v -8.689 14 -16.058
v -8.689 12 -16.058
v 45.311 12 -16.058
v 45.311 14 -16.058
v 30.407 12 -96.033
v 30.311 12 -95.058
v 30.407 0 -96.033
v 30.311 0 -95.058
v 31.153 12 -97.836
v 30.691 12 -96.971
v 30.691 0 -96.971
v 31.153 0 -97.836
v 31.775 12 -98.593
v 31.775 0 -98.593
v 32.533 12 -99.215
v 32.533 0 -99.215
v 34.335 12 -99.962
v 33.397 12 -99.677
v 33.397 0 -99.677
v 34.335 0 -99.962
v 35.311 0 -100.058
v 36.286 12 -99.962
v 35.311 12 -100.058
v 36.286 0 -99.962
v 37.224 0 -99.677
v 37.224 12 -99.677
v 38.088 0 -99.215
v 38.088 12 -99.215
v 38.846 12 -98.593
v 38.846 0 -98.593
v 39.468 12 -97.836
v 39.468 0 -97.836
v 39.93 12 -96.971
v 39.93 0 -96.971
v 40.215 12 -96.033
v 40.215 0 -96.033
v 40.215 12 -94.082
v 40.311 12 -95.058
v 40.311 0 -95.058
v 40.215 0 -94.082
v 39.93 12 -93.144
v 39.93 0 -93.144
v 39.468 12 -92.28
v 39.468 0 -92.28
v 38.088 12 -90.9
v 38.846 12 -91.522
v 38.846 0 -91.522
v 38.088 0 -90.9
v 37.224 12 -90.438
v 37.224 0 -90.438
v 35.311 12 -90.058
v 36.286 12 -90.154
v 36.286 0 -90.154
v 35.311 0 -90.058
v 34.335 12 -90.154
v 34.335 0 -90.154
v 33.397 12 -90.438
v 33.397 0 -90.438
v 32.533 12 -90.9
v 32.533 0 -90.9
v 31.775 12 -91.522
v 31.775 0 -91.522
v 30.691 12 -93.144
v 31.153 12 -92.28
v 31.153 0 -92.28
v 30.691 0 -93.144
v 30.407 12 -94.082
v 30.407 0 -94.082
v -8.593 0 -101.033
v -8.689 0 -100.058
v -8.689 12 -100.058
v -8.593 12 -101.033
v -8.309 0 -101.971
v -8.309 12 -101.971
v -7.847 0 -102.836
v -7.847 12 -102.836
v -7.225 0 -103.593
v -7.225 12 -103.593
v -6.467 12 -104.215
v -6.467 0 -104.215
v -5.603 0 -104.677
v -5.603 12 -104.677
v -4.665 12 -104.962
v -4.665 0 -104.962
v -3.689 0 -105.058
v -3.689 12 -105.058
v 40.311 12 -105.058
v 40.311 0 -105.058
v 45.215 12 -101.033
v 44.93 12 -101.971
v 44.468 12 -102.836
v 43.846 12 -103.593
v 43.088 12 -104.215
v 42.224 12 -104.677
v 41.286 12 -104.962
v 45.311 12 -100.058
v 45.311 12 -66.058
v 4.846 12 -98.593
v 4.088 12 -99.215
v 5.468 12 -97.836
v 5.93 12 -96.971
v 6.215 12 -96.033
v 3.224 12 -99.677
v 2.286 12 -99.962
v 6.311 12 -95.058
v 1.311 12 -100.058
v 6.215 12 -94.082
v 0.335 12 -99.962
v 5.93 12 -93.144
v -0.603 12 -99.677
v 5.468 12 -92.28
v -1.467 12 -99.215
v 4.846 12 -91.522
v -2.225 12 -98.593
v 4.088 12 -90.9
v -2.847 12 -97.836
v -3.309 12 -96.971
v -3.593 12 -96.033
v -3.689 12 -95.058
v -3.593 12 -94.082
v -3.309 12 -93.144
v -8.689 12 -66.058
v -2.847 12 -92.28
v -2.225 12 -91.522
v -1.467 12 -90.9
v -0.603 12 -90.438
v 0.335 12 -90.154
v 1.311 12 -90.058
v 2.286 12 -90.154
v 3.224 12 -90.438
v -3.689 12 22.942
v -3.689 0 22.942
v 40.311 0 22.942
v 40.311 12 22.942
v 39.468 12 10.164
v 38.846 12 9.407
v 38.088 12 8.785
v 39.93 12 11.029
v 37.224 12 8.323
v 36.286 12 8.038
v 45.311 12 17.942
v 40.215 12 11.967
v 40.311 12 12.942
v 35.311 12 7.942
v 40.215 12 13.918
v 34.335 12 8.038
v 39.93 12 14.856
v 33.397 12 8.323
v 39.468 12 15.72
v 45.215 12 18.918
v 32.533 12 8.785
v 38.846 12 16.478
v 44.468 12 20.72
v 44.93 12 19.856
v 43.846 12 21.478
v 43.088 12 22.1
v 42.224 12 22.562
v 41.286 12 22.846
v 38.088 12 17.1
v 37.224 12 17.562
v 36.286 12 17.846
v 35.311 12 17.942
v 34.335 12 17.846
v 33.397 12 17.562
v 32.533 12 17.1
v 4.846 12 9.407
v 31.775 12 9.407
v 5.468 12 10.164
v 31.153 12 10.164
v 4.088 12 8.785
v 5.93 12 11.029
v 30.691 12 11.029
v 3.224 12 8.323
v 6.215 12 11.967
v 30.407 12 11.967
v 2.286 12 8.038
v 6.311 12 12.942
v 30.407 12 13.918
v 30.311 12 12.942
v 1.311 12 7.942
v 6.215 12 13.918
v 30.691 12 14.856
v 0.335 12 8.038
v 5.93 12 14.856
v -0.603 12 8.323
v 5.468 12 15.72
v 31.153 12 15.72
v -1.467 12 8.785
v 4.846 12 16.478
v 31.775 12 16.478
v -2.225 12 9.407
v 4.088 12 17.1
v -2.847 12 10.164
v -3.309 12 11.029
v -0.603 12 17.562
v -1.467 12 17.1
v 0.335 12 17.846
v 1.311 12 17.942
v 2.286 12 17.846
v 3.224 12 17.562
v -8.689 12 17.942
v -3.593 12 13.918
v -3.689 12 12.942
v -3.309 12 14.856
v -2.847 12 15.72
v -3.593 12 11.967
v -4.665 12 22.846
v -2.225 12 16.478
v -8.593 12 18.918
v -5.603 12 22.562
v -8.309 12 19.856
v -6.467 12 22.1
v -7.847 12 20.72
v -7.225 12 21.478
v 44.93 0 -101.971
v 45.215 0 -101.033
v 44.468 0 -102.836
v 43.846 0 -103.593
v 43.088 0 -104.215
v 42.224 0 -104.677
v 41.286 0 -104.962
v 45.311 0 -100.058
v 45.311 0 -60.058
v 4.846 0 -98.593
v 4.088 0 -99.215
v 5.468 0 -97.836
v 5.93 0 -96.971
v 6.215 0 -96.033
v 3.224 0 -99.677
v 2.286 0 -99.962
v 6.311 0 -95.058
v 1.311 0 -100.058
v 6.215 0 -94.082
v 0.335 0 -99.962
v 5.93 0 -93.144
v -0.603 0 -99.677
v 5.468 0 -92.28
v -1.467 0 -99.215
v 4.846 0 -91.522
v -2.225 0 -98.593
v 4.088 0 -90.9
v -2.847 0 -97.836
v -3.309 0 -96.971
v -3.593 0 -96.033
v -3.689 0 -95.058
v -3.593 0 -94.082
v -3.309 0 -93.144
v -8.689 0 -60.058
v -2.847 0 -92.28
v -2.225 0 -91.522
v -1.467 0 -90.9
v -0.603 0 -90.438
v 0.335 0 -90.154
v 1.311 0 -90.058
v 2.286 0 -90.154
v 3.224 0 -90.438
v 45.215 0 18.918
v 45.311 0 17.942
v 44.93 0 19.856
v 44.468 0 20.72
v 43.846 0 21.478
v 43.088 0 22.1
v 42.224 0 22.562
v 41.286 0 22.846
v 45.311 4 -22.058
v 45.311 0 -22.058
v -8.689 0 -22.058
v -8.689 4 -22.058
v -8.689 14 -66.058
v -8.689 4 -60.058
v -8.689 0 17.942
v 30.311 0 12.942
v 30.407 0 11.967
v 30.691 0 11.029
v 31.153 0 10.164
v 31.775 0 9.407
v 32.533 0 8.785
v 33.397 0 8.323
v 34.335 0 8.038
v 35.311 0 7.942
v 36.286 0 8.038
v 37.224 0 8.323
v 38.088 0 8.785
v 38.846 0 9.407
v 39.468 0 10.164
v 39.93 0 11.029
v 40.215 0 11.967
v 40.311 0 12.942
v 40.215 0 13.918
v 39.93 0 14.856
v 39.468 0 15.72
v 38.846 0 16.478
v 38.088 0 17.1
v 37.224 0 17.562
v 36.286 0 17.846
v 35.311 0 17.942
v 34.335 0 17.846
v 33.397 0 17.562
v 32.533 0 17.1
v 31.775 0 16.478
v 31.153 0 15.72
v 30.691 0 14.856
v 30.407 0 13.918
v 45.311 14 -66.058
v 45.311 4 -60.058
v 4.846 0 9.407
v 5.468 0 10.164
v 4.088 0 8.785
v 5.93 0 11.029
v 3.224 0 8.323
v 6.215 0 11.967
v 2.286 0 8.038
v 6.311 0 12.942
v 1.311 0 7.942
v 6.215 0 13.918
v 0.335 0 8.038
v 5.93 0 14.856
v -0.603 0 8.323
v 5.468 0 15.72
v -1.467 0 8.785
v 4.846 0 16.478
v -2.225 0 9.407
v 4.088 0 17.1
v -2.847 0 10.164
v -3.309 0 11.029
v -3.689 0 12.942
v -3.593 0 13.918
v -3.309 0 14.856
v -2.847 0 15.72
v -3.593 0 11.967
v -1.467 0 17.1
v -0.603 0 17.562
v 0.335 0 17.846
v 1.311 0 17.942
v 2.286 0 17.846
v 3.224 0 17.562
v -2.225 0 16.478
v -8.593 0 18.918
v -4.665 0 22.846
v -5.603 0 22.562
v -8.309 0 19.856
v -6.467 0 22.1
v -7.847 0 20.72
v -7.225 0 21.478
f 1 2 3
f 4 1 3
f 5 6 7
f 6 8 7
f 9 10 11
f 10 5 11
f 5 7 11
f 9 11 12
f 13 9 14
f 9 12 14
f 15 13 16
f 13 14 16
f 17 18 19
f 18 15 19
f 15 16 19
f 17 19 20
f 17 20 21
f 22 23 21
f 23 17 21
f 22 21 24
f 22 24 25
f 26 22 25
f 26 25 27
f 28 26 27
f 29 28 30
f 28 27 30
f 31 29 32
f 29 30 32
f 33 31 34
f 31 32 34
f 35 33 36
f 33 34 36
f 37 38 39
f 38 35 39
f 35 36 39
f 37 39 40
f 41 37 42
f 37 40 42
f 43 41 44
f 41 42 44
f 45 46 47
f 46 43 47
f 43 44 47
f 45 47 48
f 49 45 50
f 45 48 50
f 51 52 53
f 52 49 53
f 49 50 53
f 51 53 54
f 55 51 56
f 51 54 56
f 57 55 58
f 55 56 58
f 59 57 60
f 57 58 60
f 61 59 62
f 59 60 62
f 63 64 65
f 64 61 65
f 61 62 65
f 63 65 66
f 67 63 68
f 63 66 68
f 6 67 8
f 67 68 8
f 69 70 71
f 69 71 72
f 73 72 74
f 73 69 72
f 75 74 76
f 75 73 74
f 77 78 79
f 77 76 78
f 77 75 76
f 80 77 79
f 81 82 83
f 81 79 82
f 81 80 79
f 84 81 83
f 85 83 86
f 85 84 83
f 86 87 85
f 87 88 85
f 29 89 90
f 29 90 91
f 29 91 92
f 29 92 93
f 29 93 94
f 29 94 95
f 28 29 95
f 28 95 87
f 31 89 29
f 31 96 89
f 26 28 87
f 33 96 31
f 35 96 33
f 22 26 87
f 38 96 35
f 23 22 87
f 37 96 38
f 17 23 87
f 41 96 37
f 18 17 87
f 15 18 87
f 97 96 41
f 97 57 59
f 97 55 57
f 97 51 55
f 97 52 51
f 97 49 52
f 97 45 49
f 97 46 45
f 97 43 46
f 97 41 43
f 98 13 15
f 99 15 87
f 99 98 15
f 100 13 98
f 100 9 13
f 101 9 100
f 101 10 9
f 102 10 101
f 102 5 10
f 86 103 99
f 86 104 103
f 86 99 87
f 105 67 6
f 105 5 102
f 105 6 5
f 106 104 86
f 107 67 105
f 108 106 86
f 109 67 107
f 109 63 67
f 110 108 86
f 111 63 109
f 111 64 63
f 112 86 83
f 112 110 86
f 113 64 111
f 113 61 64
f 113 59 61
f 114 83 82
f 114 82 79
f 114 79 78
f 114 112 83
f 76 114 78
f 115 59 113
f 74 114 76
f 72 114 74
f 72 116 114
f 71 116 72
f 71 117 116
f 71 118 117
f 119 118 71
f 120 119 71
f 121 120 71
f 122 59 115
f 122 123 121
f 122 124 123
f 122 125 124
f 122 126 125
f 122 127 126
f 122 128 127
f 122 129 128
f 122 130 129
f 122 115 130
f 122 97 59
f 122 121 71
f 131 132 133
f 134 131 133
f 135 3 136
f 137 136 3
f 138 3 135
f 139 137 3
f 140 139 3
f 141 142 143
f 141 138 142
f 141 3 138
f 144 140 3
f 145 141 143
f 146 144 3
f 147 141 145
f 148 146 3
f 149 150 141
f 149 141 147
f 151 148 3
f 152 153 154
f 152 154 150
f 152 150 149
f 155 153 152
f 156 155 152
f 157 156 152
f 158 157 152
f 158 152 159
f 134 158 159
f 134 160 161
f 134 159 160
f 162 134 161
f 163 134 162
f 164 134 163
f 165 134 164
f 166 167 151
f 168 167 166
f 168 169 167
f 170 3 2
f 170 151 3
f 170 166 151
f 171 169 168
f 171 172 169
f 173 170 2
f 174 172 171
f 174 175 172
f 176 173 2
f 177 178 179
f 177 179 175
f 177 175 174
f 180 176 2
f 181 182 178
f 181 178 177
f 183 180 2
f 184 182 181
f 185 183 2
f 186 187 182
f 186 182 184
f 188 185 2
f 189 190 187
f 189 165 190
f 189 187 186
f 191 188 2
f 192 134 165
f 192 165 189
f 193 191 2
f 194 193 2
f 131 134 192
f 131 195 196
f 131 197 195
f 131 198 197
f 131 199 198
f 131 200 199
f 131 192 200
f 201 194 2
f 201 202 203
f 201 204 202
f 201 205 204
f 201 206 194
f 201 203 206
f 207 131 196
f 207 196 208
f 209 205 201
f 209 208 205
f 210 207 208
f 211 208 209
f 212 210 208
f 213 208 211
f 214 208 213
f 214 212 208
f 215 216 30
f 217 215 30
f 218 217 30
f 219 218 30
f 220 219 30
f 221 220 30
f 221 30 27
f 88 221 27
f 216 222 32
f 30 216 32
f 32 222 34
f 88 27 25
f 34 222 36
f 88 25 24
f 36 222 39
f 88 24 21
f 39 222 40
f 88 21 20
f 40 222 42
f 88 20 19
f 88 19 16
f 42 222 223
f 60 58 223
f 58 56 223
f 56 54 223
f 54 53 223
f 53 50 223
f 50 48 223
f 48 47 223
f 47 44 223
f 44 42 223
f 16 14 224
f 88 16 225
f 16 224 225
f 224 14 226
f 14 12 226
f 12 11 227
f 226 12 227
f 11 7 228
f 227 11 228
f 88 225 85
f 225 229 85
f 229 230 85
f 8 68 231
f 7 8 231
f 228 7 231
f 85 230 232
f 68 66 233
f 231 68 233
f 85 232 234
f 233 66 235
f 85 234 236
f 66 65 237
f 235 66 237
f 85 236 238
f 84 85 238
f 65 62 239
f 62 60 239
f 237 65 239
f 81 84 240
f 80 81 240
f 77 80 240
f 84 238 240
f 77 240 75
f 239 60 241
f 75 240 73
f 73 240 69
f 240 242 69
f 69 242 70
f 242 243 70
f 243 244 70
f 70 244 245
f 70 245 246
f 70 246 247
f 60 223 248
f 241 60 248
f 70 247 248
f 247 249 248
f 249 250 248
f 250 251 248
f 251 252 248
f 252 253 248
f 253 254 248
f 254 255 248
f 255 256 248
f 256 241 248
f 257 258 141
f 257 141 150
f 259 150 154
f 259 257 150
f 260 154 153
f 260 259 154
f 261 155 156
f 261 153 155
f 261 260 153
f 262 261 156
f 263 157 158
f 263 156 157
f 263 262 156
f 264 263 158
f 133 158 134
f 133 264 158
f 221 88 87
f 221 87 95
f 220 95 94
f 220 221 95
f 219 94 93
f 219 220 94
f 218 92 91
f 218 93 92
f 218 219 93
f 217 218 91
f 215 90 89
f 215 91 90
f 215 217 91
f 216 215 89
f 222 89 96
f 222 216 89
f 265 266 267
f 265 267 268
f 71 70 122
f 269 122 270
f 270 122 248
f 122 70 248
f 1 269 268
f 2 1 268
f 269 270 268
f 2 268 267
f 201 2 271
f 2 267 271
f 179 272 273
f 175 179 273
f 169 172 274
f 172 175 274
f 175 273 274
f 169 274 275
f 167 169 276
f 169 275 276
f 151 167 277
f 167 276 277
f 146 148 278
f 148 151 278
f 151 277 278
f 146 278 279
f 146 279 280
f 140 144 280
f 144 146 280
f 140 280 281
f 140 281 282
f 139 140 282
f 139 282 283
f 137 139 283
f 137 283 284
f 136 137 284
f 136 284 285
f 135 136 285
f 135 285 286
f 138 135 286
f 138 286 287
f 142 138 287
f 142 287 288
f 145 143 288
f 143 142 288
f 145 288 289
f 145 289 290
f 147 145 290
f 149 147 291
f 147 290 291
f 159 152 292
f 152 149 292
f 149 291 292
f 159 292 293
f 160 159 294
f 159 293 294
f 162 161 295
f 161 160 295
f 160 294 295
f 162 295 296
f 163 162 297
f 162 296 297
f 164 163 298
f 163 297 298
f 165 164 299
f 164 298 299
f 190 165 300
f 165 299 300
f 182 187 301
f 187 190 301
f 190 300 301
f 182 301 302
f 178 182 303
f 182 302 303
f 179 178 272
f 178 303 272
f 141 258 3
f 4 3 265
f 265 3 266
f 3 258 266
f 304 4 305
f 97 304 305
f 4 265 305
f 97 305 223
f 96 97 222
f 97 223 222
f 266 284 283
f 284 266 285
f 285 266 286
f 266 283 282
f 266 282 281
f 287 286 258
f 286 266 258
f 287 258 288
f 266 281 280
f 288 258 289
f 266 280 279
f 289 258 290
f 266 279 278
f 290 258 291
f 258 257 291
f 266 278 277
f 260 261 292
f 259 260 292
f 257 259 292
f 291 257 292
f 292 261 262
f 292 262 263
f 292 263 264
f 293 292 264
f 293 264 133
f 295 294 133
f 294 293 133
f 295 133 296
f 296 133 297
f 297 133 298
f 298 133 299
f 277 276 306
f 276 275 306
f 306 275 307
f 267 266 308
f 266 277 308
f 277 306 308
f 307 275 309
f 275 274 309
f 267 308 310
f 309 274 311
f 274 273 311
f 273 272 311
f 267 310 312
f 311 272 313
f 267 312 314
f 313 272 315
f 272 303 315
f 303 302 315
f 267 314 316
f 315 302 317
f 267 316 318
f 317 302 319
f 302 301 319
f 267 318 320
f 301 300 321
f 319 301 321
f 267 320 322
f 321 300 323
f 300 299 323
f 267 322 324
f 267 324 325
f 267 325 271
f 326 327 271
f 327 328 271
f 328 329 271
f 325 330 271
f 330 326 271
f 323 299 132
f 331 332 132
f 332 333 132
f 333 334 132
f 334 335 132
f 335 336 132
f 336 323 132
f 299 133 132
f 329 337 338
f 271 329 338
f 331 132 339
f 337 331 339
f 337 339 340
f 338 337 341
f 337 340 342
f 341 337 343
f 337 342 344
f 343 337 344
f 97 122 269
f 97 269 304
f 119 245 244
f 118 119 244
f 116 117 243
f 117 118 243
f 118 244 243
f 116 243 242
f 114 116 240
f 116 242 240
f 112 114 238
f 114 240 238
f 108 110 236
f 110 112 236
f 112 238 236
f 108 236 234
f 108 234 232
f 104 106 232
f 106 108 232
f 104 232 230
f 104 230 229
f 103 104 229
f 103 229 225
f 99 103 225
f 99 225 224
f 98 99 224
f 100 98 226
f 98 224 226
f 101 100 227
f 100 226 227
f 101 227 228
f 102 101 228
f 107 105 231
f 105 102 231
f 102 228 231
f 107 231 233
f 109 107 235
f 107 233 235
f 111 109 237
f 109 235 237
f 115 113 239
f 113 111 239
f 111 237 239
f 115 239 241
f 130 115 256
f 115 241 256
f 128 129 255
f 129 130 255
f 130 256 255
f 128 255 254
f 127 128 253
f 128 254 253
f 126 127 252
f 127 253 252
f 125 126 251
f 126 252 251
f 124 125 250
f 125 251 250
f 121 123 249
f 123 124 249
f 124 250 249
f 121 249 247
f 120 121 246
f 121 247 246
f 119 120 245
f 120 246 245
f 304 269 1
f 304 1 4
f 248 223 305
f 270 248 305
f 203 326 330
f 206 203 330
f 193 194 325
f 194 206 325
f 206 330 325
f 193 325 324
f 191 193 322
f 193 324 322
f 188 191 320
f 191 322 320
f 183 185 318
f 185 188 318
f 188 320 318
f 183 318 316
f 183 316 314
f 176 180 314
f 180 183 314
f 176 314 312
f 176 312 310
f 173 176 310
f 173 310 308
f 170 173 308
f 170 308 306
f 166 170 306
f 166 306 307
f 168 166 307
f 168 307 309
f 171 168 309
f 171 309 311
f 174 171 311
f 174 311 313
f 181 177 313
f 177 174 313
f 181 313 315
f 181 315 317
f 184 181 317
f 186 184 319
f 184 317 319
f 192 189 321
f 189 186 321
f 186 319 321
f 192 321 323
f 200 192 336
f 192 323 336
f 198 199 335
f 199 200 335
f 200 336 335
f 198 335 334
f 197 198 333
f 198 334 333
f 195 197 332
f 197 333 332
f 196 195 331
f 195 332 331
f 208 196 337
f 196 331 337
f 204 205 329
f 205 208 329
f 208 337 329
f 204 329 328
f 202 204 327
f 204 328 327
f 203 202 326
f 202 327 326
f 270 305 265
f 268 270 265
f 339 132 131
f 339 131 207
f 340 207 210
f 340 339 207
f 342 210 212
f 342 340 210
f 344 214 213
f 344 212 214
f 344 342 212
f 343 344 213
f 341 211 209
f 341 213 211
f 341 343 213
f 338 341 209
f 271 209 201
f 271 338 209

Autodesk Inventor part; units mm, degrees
ref_plane "YZ Plane" through (0, 0, 0) normal (1, 0, 0) x (0, 1, 0)
ref_plane "XZ Plane" through (0, 0, 0) normal (0, 1, 0) x (-1, 0, 0)
ref_plane "XY Plane" through (0, 0, 0) normal (0, 0, 1) x (1, 0, 0)
sketch "Sketch1" plane through (0, 0, 0) normal (0, 1, 0) x (-1, 0, 0)
  line L0 (3.6894, 22.9423) -> (-40.3106, 22.9423)
  line L1 (-45.3106, 17.9423) -> (-45.3106, -100.0577)
  line L2 (-40.3106, -105.0577) -> (3.6894, -105.0577)
  line L3 (8.6894, -100.0577) -> (8.6894, 17.9423)
  arc A0 (8.6894, 17.9423) -> (3.6894, 22.9423) centre (3.6894, 17.9423) ccw
  arc A1 (3.6894, -105.0577) -> (8.6894, -100.0577) centre (3.6894, -100.0577) ccw
  arc A2 (-40.3106, 22.9423) -> (-45.3106, 17.9423) centre (-40.3106, 17.9423) ccw
  arc A3 (-45.3106, -100.0577) -> (-40.3106, -105.0577) centre (-40.3106, -100.0577) ccw
  circle A4 centre (-1.3106, 12.9423) radius 5
  circle A5 centre (-1.3106, -95.0577) radius 5
  circle A6 centre (-35.3106, 12.9423) radius 5
  circle A7 centre (-35.3106, -95.0577) radius 5
  point P0 (0, 0)
  point P1 (-45.3106, -105.0577)
  point P2 (-45.3106, 22.9423)
  point P3 (8.6894, -105.0577)
  dimension "d0" = 54
  dimension "d1" = 128
  dimension "d2" = 5
  dimension "d3" = 5
  dimension "d4" = 5
  dimension "d5" = 5
  dimension "d6" = 10
  dimension "d7" = 10
  dimension "d8" = 10
  dimension "d9" = 10
  dimension "d10" = 10
  dimension "d11" = 10
  dimension "d12" = 10
  dimension "d13" = 10
  dimension "d14" = 10
  dimension "d15" = 10
  dimension "d16" = 10
  dimension "d17" = 10
extrude "Extrusion1" add sketch "Sketch1" along normal blind 12
sketch "Sketch2" plane through (0, 12, 0) normal (0, 1, 0) x (1, 0, 0)
  arc A0 (-8.6894, -17.9423) -> (-3.6894, -22.9423) centre (-3.6894, -17.9423) ccw projected
  line L0 (40.3106, 105.0577) -> (-3.6894, 105.0577) projected
  line L1 (-8.6894, 100.0577) -> (-8.6894, -17.9423) projected
  line L2 (-8.6894, 41.0577) -> (-8.6894, 16.0577)
  line L3 (-8.6894, 41.0577) -> (-8.6894, 66.0577)
  line L4 (-8.6894, 16.0577) -> (45.3106, 16.0577)
  line L5 (45.3106, -17.9423) -> (45.3106, 100.0577) projected
  line L6 (-8.6894, 66.0577) -> (45.3106, 66.0577)
  line L7 (45.3106, 66.0577) -> (45.3106, 16.0577)
  point P0 (0, 0)
  dimension "d21" = 25
  dimension "d22" = 25
extrude "Extrusion2" add sketch "Sketch2" along normal blind 2
sketch "Sketch3" plane through (45.3106, 0, 17.9423) normal (1, 0, 0) x (0, 0, -1)
  line L0 (34, 14) -> (59, 14)
  line L1 (118, 0) -> (0, 0) projected
  line L2 (59, 0) -> (40, 0)
  line L3 (59, 0) -> (78, 0)
  line L4 (40, 0) -> (40, 4)
  line L5 (78, 0) -> (78, 4)
  line L6 (78, 4) -> (40, 4)
  point P0 (17.9423, 0)
  dimension "d26" = 19
  dimension "d27" = 19
  dimension "d28" = 4
  dimension "d29" = 4
extrude "Extrusion3" cut sketch "Sketch3" against normal blind 54
properties part number "ttab"
